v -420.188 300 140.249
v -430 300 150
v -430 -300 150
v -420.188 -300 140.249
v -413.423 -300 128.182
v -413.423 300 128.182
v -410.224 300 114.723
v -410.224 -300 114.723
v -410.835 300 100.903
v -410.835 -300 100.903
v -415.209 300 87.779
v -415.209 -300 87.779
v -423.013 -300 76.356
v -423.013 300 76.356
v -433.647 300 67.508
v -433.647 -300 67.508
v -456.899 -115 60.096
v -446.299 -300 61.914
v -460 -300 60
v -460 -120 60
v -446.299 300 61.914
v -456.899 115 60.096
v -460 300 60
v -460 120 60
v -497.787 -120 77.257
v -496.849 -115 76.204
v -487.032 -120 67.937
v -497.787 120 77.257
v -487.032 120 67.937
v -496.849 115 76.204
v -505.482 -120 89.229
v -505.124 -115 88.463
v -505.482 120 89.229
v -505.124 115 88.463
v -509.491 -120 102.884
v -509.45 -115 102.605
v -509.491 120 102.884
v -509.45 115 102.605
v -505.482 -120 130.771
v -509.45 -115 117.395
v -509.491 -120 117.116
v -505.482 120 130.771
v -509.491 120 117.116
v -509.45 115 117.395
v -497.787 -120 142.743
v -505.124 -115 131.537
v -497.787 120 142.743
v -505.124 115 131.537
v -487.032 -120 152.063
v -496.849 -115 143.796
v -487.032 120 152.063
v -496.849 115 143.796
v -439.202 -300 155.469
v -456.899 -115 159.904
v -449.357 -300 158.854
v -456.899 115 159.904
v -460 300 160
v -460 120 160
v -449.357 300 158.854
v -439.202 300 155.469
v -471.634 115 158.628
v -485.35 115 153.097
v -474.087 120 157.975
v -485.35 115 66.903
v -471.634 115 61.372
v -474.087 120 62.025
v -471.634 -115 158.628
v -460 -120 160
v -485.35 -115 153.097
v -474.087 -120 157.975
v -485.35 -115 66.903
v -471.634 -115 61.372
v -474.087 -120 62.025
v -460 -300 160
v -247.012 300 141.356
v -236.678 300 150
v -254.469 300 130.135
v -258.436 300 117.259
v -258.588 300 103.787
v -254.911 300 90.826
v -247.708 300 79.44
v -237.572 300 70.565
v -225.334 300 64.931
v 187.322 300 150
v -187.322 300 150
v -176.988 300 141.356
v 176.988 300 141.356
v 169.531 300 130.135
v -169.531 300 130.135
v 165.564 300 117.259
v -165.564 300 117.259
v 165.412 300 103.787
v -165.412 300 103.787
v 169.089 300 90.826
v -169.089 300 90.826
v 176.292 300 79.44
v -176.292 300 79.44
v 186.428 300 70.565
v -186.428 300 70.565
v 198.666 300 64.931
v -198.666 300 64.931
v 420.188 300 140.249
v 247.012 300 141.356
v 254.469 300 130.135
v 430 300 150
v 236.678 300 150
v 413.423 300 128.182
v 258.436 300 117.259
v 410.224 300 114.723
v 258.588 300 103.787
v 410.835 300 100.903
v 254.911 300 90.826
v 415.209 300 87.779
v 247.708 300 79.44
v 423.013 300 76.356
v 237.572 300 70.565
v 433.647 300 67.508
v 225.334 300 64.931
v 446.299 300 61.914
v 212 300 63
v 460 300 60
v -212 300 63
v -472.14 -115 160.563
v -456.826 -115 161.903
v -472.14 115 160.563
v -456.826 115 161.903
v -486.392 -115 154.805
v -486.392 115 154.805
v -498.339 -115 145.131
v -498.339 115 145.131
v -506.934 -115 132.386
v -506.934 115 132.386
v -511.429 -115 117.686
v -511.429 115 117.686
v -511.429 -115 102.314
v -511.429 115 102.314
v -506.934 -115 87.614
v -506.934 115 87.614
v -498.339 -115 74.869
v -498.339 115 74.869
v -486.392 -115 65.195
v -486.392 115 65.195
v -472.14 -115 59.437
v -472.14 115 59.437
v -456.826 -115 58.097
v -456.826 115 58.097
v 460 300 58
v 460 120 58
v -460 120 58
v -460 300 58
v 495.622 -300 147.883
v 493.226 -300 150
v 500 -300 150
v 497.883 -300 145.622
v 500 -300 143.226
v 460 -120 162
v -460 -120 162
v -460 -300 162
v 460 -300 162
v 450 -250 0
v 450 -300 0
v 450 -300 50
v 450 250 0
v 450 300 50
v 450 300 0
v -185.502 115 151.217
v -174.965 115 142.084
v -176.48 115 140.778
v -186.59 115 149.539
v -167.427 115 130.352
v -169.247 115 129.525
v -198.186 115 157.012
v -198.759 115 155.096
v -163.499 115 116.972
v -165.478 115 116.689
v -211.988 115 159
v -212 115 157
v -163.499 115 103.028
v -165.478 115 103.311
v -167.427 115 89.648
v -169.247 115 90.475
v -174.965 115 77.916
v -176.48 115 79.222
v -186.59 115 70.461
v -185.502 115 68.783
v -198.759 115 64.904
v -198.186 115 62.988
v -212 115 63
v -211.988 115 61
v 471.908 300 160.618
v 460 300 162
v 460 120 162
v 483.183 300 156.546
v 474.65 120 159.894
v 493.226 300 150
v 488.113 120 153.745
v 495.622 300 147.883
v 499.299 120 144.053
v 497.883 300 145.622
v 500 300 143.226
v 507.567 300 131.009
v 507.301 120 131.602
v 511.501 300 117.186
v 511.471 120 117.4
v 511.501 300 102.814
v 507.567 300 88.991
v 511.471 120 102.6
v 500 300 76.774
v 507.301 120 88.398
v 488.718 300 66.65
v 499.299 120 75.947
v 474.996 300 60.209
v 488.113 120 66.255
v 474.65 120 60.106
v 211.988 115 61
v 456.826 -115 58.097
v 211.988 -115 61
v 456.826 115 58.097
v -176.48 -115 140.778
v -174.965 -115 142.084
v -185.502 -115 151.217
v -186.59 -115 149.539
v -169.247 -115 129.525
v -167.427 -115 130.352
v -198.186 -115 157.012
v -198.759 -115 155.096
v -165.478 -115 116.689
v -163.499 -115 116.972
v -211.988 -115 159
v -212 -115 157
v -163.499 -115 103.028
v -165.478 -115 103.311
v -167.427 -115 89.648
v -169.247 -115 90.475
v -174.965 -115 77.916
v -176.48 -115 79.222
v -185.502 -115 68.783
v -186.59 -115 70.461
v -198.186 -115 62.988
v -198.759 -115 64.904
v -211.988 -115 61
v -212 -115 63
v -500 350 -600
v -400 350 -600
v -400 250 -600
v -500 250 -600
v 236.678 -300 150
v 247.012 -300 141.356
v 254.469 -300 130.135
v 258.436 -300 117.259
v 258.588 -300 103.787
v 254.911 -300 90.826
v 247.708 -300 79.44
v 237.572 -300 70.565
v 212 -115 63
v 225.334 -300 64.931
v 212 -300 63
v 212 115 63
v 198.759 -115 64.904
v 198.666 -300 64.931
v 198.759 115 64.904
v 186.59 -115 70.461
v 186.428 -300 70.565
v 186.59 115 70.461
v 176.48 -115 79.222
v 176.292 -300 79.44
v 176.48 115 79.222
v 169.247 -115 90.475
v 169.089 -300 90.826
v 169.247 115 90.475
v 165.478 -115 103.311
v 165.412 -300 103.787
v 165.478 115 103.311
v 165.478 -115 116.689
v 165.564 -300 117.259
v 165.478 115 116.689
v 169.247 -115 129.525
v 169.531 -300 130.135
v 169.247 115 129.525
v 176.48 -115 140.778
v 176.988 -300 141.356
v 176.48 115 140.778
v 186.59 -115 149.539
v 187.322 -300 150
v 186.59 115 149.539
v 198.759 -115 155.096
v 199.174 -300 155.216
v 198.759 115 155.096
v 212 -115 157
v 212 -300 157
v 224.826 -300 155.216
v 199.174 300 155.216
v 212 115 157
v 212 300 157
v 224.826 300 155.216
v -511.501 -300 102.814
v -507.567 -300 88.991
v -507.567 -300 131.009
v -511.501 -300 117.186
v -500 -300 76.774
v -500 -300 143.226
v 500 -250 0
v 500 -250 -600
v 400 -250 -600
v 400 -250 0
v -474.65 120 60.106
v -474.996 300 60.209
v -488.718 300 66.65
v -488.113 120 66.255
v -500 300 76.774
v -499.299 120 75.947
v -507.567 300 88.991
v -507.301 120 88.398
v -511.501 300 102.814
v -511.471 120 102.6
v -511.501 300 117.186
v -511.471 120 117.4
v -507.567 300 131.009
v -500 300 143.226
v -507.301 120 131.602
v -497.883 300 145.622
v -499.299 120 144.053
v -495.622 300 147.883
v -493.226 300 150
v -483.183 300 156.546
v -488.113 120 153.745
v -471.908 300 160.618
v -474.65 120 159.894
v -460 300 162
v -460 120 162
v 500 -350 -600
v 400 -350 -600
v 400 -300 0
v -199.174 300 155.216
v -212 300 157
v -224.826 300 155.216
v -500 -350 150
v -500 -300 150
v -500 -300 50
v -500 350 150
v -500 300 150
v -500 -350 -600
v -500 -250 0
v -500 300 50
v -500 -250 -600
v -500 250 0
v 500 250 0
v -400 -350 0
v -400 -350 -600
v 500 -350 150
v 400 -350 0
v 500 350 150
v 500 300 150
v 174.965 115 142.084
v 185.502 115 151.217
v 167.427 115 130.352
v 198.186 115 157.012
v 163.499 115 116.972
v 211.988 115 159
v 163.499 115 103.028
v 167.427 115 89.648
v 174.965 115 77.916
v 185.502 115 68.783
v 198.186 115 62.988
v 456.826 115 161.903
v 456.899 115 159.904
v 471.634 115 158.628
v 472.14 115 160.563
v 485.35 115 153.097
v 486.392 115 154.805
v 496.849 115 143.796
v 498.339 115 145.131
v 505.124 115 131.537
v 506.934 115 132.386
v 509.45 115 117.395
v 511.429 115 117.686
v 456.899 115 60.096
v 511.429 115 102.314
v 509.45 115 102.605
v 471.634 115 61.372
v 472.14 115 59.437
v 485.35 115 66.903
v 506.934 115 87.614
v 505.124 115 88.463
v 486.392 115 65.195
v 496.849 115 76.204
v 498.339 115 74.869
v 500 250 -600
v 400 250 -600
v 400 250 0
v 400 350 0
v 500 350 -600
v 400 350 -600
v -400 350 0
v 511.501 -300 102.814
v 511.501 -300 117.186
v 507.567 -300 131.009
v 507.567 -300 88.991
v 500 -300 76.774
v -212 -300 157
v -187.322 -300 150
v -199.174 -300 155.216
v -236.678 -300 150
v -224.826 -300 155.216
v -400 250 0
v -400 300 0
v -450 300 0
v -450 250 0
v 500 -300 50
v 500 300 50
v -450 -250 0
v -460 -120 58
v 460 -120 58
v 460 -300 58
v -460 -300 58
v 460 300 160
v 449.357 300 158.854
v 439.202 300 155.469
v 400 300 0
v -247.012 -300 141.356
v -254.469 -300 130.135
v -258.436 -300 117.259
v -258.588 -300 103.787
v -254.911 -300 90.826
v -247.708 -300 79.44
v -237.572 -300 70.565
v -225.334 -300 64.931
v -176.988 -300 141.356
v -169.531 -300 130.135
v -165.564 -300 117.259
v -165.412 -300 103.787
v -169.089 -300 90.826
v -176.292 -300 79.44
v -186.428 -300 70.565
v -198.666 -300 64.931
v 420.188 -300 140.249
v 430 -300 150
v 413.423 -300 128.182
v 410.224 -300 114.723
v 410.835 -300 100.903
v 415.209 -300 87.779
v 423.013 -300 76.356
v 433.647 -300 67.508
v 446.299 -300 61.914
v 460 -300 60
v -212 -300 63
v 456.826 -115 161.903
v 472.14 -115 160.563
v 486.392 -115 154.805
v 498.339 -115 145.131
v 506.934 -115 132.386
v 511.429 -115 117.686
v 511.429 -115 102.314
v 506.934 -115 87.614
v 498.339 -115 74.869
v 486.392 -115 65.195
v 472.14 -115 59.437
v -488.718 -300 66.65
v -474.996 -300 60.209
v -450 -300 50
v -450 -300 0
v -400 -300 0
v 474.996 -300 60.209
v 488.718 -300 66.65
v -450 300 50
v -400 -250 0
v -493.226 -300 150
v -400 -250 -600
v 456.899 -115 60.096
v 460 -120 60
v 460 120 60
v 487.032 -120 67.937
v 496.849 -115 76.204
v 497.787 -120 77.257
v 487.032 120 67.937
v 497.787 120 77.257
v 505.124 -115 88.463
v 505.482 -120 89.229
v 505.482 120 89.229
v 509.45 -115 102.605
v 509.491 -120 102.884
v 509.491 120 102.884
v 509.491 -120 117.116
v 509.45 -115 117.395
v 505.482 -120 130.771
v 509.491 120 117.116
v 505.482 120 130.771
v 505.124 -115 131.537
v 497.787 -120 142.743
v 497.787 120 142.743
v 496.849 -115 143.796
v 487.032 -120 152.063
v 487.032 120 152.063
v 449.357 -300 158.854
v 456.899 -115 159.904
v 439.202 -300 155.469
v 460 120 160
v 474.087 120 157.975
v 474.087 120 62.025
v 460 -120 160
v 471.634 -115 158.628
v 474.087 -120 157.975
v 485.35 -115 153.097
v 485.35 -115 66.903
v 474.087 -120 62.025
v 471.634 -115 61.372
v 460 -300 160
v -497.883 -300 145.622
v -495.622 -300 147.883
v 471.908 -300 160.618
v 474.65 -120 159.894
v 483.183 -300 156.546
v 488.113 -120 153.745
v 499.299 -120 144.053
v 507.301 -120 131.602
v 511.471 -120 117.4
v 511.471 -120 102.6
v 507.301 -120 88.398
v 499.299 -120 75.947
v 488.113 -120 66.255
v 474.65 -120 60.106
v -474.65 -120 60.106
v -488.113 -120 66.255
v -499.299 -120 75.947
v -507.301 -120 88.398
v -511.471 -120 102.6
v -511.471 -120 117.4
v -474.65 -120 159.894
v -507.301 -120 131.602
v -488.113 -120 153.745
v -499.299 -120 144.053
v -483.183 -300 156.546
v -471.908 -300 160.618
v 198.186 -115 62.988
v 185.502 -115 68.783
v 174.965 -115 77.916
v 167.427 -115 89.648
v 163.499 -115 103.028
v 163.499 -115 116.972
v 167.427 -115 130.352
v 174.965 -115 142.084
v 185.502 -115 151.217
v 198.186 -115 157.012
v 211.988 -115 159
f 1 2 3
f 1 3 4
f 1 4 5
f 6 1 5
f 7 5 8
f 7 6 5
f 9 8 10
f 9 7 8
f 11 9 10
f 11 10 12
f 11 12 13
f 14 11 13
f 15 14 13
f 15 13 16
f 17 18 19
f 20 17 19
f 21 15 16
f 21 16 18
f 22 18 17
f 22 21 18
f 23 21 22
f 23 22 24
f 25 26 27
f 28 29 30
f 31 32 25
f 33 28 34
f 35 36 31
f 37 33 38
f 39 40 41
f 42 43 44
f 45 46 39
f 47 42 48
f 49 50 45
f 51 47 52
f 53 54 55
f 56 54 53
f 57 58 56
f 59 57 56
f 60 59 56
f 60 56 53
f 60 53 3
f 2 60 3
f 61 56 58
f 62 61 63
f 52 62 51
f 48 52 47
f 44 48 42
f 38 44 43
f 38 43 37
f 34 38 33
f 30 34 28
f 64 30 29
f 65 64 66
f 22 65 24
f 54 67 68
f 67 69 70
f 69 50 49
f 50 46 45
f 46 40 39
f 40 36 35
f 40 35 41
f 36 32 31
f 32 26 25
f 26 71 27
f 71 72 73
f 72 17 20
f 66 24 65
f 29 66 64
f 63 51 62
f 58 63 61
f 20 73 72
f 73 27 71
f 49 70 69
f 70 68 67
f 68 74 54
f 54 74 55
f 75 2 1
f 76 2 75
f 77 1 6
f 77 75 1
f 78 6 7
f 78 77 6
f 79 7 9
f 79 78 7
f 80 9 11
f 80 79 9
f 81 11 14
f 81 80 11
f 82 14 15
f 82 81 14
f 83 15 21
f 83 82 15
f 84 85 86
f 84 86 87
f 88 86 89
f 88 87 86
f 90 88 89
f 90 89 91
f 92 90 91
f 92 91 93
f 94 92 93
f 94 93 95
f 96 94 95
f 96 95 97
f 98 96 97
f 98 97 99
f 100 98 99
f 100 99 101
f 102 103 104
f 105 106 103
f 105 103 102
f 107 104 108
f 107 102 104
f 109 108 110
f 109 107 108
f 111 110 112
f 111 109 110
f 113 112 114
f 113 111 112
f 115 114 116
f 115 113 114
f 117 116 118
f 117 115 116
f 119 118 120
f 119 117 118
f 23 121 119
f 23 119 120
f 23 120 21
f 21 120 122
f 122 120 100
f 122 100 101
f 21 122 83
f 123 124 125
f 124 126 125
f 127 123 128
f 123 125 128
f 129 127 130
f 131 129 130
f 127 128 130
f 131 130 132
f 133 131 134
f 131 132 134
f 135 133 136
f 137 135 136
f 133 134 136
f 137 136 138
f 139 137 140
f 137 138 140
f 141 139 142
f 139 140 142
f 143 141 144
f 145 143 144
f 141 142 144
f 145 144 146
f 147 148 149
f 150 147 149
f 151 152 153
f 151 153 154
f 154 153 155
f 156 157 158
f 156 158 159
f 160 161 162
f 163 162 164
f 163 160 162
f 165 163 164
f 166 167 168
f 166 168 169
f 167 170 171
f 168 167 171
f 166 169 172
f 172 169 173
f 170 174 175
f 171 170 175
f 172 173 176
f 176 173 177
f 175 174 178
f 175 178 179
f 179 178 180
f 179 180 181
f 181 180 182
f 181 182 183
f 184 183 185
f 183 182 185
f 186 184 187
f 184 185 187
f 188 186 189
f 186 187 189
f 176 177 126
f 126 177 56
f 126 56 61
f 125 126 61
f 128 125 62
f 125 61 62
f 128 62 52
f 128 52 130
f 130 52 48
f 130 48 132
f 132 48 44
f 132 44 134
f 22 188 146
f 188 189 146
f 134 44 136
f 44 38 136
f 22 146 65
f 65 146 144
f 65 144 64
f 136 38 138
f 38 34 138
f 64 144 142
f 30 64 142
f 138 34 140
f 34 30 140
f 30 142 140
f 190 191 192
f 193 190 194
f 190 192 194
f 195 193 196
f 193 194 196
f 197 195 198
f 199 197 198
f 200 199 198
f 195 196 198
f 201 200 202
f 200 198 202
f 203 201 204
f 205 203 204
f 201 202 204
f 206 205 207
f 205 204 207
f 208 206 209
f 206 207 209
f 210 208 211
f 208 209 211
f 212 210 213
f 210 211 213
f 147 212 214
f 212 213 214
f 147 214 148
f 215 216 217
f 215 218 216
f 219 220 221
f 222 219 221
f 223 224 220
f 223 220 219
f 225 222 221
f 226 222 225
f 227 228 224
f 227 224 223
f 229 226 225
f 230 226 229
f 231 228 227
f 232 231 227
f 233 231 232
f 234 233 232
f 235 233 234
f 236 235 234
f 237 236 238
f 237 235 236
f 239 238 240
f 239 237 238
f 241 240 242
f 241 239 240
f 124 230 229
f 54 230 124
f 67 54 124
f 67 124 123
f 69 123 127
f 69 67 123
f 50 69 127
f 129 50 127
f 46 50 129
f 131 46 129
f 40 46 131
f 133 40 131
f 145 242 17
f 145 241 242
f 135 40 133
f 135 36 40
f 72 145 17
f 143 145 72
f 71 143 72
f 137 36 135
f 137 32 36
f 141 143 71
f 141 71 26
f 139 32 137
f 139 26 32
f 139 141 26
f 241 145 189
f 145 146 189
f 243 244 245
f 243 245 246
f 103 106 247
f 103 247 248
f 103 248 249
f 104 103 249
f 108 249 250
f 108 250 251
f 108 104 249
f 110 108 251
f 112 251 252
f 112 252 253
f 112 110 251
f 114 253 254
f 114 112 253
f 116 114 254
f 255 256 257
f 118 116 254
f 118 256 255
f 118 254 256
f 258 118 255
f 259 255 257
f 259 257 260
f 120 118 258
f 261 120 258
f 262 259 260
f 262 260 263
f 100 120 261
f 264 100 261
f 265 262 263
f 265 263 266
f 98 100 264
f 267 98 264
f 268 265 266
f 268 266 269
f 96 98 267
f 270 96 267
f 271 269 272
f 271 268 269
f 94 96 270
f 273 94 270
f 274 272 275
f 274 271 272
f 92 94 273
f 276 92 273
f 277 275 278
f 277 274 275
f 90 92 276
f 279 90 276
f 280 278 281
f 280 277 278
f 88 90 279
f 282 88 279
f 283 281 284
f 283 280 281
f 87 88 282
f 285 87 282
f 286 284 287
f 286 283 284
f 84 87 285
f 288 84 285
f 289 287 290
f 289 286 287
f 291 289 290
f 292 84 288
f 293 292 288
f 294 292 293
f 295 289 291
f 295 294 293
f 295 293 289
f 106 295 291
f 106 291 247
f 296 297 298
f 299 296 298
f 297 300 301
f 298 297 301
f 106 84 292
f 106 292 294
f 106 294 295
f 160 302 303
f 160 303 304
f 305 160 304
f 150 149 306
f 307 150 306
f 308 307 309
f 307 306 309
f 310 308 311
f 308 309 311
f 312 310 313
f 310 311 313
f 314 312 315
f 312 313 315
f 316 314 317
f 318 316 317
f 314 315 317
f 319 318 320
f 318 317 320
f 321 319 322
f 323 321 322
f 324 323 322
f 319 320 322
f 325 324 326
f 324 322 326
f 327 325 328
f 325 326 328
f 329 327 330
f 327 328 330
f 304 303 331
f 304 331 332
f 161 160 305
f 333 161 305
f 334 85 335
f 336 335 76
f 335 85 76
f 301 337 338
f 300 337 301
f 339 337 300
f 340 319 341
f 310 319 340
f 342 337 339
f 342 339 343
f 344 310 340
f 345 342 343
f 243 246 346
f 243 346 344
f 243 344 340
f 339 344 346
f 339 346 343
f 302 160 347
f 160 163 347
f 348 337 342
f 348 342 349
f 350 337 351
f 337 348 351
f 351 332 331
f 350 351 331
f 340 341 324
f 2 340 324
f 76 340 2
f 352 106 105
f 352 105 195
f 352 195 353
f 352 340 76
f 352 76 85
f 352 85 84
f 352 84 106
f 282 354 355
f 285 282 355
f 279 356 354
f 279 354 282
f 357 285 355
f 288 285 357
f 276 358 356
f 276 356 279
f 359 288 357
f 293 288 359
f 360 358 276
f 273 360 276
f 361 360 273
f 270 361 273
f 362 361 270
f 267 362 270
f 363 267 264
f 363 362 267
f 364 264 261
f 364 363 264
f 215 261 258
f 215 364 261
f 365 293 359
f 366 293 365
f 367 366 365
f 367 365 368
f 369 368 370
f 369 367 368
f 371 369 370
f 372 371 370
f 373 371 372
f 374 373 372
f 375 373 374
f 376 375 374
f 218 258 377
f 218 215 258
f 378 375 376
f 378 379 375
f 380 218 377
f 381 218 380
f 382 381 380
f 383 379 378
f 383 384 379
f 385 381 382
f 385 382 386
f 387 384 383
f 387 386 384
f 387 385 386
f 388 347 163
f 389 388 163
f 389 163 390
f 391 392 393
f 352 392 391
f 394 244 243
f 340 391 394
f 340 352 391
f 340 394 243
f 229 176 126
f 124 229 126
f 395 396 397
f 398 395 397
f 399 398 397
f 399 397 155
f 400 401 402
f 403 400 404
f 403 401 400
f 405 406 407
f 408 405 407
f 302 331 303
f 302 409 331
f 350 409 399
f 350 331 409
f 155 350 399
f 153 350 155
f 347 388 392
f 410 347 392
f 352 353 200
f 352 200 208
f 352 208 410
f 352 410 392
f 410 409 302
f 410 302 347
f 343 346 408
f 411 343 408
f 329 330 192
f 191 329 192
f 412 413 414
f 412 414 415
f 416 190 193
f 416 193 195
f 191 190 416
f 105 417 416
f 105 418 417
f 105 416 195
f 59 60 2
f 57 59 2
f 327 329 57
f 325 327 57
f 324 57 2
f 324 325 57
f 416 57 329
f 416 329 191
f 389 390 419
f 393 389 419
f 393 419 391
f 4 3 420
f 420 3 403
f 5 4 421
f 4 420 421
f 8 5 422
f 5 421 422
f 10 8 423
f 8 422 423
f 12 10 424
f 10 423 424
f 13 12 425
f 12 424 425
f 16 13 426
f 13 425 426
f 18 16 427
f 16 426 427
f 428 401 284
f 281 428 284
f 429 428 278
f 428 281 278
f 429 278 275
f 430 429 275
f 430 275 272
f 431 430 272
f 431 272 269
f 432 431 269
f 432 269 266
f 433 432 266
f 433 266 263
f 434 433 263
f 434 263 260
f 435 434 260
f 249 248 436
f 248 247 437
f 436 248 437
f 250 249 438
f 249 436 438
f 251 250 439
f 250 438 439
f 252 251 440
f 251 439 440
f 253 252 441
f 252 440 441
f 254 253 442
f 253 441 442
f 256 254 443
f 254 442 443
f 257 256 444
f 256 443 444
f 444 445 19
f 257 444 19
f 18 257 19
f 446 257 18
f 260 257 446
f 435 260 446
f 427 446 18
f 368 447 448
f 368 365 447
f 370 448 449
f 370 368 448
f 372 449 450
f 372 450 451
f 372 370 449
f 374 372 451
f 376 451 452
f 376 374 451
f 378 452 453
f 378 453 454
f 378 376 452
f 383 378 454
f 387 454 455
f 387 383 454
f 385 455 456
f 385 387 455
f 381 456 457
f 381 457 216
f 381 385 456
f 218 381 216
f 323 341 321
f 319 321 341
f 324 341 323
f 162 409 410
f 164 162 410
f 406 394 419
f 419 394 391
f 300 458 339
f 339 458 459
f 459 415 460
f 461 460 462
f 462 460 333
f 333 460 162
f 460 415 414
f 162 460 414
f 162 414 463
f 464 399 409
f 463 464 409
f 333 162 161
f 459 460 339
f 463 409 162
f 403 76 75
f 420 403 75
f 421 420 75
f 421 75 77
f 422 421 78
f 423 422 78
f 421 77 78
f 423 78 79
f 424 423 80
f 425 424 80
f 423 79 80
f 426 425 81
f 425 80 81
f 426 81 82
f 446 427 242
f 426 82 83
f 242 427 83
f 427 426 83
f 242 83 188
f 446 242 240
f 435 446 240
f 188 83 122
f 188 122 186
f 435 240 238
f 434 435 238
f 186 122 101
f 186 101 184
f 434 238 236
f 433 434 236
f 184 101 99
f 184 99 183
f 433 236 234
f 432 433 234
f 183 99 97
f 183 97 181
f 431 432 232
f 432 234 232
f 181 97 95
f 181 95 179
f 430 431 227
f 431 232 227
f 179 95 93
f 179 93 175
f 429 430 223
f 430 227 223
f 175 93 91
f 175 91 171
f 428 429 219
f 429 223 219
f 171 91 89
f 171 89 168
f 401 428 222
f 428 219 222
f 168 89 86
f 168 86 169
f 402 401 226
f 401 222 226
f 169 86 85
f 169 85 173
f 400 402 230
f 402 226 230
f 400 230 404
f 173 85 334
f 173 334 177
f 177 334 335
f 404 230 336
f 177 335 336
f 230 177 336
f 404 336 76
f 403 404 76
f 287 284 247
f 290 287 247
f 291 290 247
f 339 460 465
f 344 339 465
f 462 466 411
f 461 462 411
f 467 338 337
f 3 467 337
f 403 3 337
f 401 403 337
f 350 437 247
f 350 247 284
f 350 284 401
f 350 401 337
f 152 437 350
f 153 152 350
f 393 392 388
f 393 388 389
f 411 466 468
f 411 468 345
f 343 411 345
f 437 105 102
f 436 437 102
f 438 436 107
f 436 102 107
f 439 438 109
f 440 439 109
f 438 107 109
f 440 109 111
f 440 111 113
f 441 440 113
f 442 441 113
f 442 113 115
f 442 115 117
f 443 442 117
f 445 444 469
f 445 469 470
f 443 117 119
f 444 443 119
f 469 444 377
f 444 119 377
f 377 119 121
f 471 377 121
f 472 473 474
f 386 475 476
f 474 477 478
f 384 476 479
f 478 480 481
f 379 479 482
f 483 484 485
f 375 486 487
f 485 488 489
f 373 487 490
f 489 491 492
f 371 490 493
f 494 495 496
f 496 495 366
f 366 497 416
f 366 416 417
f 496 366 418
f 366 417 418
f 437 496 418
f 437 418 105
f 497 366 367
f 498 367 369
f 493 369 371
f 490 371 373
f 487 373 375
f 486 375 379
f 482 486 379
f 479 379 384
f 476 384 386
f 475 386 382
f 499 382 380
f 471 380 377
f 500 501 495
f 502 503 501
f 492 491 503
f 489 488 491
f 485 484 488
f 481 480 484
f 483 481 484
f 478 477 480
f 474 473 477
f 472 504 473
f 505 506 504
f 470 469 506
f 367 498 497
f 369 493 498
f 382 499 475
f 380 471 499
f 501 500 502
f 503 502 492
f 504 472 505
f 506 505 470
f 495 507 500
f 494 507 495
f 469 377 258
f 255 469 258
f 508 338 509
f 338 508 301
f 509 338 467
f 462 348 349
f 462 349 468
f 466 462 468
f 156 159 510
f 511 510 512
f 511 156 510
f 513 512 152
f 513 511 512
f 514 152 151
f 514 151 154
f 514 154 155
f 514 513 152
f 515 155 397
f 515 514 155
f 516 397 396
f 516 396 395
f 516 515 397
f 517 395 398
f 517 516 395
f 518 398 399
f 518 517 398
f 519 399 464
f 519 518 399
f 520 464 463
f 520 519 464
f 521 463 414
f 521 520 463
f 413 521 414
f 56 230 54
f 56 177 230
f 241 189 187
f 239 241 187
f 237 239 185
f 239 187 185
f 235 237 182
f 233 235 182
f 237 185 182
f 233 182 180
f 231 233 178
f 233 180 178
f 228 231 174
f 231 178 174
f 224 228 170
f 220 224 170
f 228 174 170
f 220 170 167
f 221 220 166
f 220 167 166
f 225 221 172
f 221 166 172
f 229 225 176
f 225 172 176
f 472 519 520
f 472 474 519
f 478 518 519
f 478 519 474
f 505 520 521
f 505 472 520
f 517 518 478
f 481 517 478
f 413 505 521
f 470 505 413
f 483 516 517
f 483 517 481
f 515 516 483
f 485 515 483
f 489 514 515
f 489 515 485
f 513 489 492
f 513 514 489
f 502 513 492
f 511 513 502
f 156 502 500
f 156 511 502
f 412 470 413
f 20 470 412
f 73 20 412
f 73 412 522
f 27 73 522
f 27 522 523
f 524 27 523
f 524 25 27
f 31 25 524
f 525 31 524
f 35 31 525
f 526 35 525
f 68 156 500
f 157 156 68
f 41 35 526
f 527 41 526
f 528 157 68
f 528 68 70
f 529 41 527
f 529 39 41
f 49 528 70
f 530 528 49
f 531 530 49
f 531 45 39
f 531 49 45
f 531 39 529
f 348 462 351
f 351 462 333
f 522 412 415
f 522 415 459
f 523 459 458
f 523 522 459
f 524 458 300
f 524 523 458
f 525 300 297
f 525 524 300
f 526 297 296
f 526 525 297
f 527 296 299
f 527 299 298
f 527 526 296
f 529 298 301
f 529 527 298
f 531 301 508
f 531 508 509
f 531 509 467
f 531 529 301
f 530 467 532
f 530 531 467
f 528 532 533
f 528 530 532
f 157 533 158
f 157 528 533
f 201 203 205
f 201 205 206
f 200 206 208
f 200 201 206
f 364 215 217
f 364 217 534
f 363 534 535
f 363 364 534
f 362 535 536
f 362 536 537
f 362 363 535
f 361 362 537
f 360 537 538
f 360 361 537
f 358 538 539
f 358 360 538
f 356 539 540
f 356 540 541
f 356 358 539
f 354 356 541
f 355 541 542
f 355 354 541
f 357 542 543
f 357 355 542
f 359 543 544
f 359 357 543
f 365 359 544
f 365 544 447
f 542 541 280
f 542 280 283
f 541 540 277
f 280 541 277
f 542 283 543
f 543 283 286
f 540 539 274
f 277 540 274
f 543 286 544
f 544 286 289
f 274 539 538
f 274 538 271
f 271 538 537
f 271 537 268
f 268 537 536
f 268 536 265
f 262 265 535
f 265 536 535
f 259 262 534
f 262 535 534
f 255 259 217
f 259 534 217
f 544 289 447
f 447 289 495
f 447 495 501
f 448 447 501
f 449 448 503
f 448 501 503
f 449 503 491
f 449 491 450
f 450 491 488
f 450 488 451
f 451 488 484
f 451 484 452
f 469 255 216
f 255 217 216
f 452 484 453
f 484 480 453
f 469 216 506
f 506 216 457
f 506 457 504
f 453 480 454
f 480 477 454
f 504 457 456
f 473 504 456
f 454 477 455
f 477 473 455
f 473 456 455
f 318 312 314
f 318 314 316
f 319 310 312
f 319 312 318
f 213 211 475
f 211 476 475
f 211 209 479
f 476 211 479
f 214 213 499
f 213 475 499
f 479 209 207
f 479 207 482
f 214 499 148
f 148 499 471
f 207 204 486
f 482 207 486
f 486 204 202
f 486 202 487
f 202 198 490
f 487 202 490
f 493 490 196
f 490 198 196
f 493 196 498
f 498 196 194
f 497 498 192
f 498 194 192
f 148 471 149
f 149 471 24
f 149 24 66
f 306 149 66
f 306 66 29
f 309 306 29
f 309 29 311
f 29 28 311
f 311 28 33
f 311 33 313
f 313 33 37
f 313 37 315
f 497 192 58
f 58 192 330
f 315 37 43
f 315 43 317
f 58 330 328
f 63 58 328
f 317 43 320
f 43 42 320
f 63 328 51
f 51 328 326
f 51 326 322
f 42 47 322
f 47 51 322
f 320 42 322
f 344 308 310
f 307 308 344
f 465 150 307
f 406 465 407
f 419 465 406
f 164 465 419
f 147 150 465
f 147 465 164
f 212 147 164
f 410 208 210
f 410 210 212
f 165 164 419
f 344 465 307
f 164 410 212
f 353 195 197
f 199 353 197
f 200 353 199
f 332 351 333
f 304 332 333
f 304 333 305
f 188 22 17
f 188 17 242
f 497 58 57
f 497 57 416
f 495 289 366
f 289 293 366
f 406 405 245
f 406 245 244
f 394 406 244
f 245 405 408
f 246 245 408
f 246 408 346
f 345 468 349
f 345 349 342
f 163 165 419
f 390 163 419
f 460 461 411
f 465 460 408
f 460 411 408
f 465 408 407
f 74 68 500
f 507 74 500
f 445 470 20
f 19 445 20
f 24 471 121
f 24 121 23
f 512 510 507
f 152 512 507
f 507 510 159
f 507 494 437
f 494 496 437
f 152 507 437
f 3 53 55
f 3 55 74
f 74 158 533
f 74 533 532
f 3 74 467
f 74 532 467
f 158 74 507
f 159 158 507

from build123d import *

# Parameters (mm, degrees)
SKETCH1_W            = 1000
SKETCH1_H            = 700
SKETCH1_W_2          = 900
SKETCH1_H_2          = 600
BOSS_EXTRUDE1_DEPTH  = 150
SKETCH2_W            = 100
SKETCH2_H            = 600
CUT_EXTRUDE1_DEPTH   = 1000
SKETCH3_R            = 50
BOSS_EXTRUDE2_DEPTH  = 600
BOSS_EXTRUDE3_START  = -180
BOSS_EXTRUDE3_DEPTH  = 180
SKETCH5_W            = 100
SKETCH5_H            = 100
BOSS_EXTRUDE4_DEPTH  = 600
SKETCH7_R            = 47
BOSS_EXTRUDE15_DEPTH = 600
BOSS_EXTRUDE16_DEPTH = 115


with BuildPart() as part:
    # Sketch1 → Boss-Extrude1 (new body)
    with BuildSketch(Plane.XY):
        Rectangle(SKETCH1_W, SKETCH1_H)
        Rectangle(SKETCH1_W_2, SKETCH1_H_2, mode=Mode.SUBTRACT)
    extrude(amount=BOSS_EXTRUDE1_DEPTH)

    # Sketch2 → Cut-Extrude1 (cut)
    with BuildSketch(Plane(origin=(500, 0, 0), x_dir=(0, 0, -1), z_dir=(1, 0, 0))):
        with Locations((-100, 0)):
            Rectangle(SKETCH2_W, SKETCH2_H)
    extrude(amount=-CUT_EXTRUDE1_DEPTH, mode=Mode.SUBTRACT)

    # Sketch3 → Boss-Extrude2 (add)
    with BuildSketch(Plane.XZ.offset(-300)):
        with Locations(Location((460, 110, 0), (0, 0, 126.869897646))):
            Circle(SKETCH3_R)
    boss_extrude2 = extrude(amount=BOSS_EXTRUDE2_DEPTH)

    # Mirror1: Boss-Extrude2 across plane
    add(boss_extrude2.mirror(Plane(origin=(0, 0, 0), x_dir=(0, 0, 1), z_dir=(1, 0, 0))))

    # Sketch4 → Boss-Extrude3 (add)
    with BuildSketch(Plane.XZ.offset(300).offset(BOSS_EXTRUDE3_START)):
        with BuildLine():
            Line((-460, 162), (460, 162))
            ThreePointArc((460, 162), (512, 110), (460, 58))
            Line((460, 58), (-460, 58))
            ThreePointArc((-460, 58), (-512, 110), (-460, 162))
        make_face()
        with BuildLine():
            Line((-460, 160), (460, 160))
            ThreePointArc((460, 160), (510, 110), (460, 60))
            Line((460, 60), (-460, 60))
            ThreePointArc((-460, 60), (-510, 110), (-460, 160))
        make_face(mode=Mode.SUBTRACT)
    boss_extrude3 = extrude(amount=BOSS_EXTRUDE3_DEPTH)

    # Mirror2: Boss-Extrude3 across plane
    add(boss_extrude3.mirror(Plane.ZX))

    # Sketch5 → Boss-Extrude4 (add)
    with BuildSketch(Plane(origin=(0, 0, 0), x_dir=(-1, 0, 0), z_dir=(0, 0, -1))):
        with Locations((-450, 300)):
            Rectangle(SKETCH5_W, SKETCH5_H)
        with Locations((450, 300)):
            Rectangle(SKETCH5_W, SKETCH5_H)
        with Locations((450, -300)):
            Rectangle(SKETCH5_W, SKETCH5_H)
        with Locations((-450, -300)):
            Rectangle(SKETCH5_W, SKETCH5_H)
    extrude(amount=BOSS_EXTRUDE4_DEPTH)

    # Sketch7 → Boss-Extrude15 (add)
    with BuildSketch(Plane.XZ.offset(-300)):
        with Locations(Location((-212, 110, 0), (0, 0, 121.672433426))):
            Circle(SKETCH7_R)
    boss_extrude15 = extrude(amount=BOSS_EXTRUDE15_DEPTH)

    # Sketch10 → Boss-Extrude16 (add, symmetric)
    with BuildSketch(Plane(origin=(0, 0, 0), x_dir=(1, 0, 0), z_dir=(0, 1, 0))):
        with BuildLine():
            Line((-211.988019901, -158.999998535), (-456.82601912, -161.903042737))
            ThreePointArc((-456.82601912, -161.903042737), (-512, -110), (-456.82601912, -58.096957263))
            Line((-456.82601912, -58.096957263), (-211.988019901, -61.000001465))
            ThreePointArc((-211.988019901, -61.000001465), (-163, -110), (-211.988019901, -158.999998535))
        make_face()
        with BuildLine():
            Line((-212, -157), (-456.899440499, -159.903772711))
            ThreePointArc((-456.899440499, -159.903772711), (-510, -110), (-456.899440499, -60.096227289))
            Line((-456.899440499, -60.096227289), (-212, -63))
            ThreePointArc((-212, -63), (-165, -110), (-212, -157))
        make_face(mode=Mode.SUBTRACT)
    boss_extrude16 = extrude(amount=BOSS_EXTRUDE16_DEPTH, both=True)

    # Mirror3: Boss-Extrude15, Boss-Extrude16 across plane
    add(boss_extrude15.mirror(Plane(origin=(0, 0, 0), x_dir=(0, 0, 1), z_dir=(1, 0, 0))))
    add(boss_extrude16.mirror(Plane(origin=(0, 0, 0), x_dir=(0, 0, 1), z_dir=(1, 0, 0))))


solid = part.part
